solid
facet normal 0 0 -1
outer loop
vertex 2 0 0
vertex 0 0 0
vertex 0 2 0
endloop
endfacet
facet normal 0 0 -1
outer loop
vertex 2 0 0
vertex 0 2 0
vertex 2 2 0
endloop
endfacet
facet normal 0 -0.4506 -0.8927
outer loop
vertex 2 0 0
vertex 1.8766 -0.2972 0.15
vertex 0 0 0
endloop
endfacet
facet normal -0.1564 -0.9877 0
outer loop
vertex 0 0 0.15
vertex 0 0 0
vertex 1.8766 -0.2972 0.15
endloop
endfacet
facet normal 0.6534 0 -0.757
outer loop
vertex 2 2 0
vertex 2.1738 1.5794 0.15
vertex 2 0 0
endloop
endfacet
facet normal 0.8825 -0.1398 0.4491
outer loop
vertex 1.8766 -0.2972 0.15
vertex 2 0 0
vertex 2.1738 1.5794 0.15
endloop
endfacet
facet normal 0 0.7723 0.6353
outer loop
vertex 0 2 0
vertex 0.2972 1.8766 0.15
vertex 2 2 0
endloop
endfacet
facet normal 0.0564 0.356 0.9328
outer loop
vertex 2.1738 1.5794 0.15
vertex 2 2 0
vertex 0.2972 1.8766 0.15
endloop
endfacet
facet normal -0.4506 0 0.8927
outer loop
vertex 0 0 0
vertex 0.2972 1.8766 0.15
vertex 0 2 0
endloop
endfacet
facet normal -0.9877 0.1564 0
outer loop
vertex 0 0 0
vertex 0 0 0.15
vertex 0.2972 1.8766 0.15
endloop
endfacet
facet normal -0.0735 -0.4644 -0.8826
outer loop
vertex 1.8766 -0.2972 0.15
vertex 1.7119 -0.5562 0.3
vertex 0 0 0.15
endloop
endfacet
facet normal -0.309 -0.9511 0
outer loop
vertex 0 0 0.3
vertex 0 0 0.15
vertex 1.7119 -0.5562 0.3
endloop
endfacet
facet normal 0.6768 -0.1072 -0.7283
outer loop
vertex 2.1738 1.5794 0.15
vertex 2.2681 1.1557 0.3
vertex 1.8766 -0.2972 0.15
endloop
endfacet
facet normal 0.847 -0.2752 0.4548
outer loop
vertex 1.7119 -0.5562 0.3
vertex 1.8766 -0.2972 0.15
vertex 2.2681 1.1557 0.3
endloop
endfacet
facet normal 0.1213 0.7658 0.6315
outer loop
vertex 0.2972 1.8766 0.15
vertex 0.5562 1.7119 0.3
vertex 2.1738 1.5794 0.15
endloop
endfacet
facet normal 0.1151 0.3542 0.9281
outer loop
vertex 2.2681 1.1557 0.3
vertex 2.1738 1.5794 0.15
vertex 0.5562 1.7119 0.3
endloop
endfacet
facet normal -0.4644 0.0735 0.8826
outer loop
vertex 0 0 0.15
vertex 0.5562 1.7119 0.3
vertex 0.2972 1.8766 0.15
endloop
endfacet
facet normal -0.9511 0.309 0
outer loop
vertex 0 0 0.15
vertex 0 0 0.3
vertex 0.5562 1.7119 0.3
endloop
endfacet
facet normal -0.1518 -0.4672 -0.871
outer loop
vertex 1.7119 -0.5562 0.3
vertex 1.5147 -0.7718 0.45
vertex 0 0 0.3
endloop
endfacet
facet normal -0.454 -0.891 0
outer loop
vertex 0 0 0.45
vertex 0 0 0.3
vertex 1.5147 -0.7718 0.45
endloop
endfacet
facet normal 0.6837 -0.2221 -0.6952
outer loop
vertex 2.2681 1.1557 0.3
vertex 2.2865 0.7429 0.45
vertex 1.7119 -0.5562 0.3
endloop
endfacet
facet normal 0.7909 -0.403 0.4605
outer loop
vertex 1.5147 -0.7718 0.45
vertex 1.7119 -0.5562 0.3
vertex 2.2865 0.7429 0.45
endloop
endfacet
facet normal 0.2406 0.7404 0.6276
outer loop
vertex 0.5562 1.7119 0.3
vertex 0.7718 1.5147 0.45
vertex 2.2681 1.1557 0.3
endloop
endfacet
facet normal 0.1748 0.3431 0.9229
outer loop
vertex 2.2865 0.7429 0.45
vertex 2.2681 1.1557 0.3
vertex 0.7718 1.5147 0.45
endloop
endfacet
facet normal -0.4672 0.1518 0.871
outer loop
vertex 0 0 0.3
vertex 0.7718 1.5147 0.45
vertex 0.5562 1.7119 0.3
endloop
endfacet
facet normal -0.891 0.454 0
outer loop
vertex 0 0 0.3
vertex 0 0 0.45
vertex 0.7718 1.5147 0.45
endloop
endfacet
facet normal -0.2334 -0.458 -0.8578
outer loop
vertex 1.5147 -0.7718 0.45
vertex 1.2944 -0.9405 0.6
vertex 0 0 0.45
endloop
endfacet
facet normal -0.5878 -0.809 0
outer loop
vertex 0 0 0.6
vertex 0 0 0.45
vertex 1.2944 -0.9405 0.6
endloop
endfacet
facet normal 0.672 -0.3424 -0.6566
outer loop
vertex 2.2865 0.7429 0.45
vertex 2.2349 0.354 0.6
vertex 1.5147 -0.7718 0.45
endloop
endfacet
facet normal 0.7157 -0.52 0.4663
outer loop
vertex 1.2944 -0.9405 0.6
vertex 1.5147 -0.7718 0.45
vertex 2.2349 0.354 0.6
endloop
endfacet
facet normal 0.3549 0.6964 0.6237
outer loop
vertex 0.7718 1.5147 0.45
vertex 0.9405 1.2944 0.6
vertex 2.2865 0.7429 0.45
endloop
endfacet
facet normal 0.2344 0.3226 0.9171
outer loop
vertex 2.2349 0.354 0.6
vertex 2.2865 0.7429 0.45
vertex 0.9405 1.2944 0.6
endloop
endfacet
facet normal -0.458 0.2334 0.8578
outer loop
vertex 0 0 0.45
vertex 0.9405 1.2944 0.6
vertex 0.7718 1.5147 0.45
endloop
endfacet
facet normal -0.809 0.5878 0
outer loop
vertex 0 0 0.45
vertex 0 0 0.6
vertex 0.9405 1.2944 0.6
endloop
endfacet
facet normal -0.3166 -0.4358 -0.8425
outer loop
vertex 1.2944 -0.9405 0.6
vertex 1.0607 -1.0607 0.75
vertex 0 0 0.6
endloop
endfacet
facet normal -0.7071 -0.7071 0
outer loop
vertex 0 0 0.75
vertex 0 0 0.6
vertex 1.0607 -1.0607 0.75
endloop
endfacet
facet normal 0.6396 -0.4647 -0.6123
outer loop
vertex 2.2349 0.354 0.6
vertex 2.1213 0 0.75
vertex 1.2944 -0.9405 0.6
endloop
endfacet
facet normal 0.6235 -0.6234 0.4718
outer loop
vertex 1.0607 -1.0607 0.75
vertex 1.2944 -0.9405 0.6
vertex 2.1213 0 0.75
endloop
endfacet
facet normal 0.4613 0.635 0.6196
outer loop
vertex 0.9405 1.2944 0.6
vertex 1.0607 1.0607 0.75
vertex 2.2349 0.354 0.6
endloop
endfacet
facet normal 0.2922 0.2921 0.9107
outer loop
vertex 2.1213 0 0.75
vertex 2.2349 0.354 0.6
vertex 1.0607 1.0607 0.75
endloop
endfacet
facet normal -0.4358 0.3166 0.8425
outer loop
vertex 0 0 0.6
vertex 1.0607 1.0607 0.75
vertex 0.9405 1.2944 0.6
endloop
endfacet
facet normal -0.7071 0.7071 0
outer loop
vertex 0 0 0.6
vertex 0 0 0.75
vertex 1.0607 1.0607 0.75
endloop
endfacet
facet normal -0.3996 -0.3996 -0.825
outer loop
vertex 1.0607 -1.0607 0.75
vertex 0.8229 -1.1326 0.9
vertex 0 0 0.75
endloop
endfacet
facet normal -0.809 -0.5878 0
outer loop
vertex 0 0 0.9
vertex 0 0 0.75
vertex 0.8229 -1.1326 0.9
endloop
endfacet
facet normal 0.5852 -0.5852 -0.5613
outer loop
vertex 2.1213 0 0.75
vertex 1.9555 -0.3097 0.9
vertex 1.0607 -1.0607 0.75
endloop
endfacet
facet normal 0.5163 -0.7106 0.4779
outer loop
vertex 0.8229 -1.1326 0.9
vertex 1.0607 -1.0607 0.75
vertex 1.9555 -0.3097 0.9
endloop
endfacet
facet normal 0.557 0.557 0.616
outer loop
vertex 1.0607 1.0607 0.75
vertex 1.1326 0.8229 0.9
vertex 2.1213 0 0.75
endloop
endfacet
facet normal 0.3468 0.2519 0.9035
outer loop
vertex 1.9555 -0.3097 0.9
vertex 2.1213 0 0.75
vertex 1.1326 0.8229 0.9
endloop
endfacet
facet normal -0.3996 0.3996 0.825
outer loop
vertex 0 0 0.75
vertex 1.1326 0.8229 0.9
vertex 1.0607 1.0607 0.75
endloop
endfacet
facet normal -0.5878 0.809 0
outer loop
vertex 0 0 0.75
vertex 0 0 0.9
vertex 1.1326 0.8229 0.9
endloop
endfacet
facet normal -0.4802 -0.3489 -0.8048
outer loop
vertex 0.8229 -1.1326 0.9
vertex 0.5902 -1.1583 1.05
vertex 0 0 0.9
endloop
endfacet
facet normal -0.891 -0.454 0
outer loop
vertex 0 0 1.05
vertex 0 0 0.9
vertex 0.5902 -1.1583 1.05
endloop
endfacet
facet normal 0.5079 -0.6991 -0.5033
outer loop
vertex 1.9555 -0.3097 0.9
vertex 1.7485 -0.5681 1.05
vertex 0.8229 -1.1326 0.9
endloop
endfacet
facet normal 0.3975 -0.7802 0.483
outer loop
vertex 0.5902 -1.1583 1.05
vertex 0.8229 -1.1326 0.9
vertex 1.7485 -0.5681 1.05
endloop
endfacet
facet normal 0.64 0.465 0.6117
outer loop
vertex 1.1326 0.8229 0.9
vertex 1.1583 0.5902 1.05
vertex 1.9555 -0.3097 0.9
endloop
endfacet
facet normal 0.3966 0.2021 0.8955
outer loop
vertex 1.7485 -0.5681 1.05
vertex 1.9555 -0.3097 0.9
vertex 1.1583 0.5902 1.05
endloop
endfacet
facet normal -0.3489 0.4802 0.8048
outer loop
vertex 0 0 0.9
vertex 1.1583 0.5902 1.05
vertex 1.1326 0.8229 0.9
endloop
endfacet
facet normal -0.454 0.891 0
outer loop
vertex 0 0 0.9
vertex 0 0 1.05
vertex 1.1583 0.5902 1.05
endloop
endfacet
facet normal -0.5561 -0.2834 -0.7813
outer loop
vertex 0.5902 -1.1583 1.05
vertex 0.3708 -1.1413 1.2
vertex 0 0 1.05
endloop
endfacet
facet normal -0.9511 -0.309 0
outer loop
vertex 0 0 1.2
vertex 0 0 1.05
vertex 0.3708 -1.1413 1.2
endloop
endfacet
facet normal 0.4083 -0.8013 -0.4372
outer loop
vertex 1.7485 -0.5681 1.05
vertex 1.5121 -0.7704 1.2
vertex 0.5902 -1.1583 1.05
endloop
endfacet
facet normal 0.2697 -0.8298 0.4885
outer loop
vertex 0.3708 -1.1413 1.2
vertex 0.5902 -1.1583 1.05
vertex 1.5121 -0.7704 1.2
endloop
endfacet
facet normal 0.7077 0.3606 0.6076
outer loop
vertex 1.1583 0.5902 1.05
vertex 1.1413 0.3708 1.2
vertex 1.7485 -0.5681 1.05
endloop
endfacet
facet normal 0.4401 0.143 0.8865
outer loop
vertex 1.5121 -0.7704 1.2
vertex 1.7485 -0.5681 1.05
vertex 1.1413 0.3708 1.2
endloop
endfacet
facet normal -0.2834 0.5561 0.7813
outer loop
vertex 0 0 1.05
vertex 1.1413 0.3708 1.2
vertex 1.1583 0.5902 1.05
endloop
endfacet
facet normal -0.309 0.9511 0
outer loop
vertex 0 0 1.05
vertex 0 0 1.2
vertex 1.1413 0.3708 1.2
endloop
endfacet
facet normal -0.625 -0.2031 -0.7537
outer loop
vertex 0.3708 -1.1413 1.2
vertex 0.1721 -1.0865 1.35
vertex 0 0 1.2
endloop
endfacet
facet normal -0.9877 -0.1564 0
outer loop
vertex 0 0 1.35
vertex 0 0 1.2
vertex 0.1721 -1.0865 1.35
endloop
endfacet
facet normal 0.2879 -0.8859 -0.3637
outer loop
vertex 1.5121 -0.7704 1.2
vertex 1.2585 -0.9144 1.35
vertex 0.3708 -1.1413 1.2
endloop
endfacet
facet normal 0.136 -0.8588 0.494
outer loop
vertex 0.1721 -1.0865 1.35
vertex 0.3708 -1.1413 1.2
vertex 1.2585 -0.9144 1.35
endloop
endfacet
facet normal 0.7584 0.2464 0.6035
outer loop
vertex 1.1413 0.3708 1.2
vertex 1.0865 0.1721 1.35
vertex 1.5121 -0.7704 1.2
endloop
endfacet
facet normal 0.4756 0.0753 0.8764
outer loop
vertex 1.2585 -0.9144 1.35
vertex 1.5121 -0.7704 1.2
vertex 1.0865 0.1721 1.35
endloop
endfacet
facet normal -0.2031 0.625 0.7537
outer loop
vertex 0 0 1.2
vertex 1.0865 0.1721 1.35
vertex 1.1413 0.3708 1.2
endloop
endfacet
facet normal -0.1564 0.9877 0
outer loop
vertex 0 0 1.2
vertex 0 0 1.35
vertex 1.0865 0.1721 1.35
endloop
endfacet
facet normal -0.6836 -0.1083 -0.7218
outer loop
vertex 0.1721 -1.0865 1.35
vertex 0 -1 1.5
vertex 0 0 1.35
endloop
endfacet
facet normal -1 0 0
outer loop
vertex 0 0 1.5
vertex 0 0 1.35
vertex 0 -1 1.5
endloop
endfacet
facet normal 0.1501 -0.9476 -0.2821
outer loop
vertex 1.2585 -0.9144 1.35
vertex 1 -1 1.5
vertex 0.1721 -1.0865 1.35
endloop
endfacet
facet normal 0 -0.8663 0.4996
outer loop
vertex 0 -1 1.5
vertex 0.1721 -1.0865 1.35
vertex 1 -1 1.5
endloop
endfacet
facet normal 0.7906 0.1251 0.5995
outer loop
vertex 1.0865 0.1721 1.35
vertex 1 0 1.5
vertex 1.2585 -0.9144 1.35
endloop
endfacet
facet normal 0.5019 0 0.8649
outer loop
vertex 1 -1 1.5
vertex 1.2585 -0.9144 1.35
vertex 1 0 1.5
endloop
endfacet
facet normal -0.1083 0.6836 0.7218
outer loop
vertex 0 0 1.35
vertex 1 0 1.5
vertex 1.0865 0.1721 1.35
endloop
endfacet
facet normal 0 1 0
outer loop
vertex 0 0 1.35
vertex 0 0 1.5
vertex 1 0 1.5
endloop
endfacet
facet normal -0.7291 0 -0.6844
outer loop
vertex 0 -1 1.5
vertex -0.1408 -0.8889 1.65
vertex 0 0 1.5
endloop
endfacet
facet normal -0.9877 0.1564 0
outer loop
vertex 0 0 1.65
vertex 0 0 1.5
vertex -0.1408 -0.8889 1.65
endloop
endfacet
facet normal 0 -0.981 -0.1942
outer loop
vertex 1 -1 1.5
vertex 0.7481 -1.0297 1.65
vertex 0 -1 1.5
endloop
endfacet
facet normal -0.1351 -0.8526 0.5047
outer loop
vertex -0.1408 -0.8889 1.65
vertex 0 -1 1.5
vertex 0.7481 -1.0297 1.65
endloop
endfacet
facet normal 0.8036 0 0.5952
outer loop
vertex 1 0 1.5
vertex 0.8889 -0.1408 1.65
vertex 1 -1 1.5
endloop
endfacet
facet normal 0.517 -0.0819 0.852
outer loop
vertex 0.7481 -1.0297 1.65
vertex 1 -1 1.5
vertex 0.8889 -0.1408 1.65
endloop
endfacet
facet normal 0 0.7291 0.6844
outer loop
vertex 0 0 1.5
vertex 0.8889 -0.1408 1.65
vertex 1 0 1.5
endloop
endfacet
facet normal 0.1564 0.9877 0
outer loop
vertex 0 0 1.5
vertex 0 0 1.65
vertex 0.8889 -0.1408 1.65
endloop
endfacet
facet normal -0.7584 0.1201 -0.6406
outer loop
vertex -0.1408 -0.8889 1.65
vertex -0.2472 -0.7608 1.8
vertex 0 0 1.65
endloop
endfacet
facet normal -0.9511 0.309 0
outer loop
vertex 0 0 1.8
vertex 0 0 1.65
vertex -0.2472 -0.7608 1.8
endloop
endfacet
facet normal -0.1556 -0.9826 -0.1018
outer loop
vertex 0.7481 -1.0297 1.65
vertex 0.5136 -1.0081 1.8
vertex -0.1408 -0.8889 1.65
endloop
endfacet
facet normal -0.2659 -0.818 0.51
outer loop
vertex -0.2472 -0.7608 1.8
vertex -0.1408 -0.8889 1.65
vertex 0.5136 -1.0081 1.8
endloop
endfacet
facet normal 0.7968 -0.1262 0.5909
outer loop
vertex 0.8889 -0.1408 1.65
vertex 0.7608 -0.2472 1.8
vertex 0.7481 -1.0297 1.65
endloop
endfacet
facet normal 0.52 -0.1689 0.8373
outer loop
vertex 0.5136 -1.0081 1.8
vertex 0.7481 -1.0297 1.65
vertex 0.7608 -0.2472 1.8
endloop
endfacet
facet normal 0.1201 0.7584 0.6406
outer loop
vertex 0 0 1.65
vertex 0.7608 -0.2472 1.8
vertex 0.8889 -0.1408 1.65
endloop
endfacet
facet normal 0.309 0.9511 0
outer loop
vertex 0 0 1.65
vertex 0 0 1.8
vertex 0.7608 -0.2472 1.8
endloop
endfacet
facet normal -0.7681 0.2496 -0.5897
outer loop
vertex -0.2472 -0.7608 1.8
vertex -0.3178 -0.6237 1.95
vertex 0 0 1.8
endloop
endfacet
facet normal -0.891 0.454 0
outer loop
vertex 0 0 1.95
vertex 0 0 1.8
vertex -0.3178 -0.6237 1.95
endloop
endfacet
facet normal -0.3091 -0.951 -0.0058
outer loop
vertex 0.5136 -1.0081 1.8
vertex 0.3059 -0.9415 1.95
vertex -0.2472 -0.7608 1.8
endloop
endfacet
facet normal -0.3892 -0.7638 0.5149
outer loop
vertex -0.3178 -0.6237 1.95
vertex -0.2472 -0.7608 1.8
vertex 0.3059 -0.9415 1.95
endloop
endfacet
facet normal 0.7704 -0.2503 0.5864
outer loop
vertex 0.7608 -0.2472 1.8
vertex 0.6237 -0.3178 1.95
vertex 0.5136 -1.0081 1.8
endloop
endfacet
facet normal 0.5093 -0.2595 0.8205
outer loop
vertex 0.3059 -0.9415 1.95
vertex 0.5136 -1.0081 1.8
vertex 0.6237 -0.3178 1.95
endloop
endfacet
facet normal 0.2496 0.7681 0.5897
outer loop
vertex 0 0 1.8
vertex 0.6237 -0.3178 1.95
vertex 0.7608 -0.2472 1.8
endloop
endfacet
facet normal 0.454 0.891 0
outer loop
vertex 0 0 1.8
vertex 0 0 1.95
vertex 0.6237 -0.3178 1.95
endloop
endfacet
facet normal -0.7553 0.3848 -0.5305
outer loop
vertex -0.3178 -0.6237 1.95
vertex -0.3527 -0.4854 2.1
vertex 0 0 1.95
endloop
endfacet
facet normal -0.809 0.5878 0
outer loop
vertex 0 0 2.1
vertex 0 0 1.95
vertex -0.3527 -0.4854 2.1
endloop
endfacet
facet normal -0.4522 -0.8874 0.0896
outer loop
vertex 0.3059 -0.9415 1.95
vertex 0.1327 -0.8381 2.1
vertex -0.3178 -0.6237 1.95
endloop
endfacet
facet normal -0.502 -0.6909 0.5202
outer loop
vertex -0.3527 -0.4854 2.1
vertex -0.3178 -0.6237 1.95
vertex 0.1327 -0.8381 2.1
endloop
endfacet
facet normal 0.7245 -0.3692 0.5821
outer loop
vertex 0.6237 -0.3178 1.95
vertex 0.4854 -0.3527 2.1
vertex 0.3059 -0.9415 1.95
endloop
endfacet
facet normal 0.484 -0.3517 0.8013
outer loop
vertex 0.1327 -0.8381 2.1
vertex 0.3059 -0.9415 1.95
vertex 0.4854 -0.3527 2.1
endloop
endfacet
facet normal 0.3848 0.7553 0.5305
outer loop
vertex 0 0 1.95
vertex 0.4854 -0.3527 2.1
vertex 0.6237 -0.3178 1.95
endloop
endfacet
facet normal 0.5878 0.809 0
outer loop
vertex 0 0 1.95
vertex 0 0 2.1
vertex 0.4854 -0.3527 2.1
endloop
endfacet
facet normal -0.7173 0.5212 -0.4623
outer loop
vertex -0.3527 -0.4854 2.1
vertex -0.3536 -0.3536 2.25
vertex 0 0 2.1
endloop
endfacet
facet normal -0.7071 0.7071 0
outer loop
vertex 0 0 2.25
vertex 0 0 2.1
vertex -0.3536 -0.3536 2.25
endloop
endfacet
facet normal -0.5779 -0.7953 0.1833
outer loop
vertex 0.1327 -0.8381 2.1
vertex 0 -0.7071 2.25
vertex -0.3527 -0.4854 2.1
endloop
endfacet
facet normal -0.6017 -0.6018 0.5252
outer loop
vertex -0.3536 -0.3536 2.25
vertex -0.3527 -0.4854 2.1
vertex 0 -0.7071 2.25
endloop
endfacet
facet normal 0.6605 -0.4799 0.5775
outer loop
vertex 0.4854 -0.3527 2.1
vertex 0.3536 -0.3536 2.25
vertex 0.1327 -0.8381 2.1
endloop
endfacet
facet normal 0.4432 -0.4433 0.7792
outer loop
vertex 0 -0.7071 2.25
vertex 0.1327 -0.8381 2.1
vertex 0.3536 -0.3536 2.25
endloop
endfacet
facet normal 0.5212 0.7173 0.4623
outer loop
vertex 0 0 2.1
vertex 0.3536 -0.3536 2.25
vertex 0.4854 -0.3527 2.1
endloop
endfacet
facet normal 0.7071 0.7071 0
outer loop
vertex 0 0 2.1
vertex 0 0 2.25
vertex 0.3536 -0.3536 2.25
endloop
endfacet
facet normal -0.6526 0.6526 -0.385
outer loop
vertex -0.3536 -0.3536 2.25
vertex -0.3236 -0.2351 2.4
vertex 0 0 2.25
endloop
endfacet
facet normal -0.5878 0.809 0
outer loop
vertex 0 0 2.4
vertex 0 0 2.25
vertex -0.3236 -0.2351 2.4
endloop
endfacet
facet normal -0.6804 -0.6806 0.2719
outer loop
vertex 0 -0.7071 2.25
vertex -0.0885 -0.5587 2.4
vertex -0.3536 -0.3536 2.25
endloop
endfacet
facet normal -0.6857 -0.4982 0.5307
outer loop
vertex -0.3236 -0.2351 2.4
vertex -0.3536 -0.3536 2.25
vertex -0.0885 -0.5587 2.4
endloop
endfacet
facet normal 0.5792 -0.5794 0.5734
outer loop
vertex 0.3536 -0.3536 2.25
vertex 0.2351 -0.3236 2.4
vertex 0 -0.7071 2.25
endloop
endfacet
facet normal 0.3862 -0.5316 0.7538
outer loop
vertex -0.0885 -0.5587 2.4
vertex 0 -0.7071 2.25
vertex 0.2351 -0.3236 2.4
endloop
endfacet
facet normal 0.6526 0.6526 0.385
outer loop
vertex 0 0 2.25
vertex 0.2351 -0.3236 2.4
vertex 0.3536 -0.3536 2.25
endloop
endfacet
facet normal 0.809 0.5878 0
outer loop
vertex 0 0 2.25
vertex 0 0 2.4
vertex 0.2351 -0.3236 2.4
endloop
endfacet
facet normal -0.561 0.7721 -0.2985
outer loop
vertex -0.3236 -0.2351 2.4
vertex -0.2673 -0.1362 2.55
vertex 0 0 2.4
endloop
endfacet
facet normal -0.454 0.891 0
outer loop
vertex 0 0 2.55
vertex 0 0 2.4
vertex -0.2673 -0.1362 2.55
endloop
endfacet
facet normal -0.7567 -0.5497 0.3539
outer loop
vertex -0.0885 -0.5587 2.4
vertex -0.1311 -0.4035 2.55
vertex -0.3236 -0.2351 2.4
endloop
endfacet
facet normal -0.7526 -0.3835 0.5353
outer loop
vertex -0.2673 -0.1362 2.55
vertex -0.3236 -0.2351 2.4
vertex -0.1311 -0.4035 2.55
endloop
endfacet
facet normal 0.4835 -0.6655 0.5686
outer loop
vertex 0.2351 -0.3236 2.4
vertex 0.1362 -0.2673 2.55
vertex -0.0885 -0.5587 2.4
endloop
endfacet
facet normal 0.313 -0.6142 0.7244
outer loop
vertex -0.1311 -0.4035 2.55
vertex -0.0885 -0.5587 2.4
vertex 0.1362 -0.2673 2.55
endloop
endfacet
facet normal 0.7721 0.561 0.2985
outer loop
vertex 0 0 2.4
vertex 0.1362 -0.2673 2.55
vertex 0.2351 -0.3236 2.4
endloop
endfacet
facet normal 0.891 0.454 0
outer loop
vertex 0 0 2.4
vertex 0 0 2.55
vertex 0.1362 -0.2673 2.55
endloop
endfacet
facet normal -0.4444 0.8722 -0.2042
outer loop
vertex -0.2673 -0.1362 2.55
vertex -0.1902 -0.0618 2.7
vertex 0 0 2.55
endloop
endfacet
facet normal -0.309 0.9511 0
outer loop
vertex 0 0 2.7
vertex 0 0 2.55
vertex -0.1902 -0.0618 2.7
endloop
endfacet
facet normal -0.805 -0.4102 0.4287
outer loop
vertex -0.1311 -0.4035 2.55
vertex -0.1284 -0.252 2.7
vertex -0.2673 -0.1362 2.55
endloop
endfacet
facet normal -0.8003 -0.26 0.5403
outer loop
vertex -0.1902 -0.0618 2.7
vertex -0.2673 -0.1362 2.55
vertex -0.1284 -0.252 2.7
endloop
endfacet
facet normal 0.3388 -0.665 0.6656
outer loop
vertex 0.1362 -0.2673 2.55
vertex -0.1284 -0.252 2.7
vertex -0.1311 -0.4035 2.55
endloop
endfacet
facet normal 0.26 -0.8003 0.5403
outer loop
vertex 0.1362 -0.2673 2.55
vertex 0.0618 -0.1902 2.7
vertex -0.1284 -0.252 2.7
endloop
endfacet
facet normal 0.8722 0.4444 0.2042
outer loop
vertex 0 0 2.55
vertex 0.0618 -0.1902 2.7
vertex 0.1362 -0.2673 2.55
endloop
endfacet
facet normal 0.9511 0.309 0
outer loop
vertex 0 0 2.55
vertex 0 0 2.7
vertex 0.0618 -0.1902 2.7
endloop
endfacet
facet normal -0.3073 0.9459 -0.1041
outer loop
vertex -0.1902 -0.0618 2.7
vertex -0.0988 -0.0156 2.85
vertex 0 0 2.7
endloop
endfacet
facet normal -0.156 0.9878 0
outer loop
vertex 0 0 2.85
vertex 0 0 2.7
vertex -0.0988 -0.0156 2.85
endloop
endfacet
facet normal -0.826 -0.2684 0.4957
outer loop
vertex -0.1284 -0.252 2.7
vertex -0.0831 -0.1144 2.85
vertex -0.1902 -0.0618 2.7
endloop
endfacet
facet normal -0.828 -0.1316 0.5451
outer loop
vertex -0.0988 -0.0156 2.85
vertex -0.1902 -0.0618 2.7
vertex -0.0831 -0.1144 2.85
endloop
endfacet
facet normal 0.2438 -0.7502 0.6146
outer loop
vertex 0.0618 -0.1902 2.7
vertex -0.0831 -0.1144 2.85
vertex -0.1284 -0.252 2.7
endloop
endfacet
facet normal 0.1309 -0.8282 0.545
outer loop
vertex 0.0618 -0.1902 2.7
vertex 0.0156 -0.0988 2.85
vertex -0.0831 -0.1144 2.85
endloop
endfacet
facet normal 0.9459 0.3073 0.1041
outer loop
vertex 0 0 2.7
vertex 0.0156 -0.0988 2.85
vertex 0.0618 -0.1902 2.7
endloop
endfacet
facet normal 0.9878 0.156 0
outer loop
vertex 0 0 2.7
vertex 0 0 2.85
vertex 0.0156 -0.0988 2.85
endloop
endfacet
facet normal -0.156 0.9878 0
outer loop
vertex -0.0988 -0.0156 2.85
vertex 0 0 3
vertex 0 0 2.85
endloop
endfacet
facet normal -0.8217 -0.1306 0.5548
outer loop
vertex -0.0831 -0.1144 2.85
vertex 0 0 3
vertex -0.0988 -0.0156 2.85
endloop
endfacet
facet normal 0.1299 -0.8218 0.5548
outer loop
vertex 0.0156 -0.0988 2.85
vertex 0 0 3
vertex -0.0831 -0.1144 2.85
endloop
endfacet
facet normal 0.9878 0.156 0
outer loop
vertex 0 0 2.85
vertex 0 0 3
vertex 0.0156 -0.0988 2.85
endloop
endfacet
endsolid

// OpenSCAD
// SYMPTOM: linear_extrude with BOTH a twist and a scale whose top collapses to
//   a POINT (scale=[0,0]) imported as a NULL shape (stage=invalid-shape, "all
//   root shapes are null"). The one-zero (line) collapse, e.g. scale=[0,1], was
//   NOT affected -- it already built a valid solid. Drove corpus
//   t3d__linear_extrude-scale-zero-tests (44.8 %) and ex__linear_extrude (24 %).
// CAUSE: OpenSCADFeatures.Twist.execute. The A2#6 degenerate-taper branch (which
//   builds the tapered solid analytically by joining base perimeter vertices to
//   their scaled top vertices) was gated on `fp.Angle.Value == 0.0`. With a twist
//   the point-collapse case skipped that branch and fell through to MakePipeShell
//   between the base wire and the zero-area point top, whose sweep direction is
//   undefined -> "gp_Dir() - input vector has zero norm" -> null shape.
// FIX: OpenSCADFeatures.py Twist.execute -> take the analytic _taper_solid path
//   whenever the top collapses to a point (abs(sx)<eps AND abs(sy)<eps),
//   regardless of the twist angle, keeping the no-twist one-zero (line) branch
//   and leaving the twist+line case on its working MakePipeShell path. A point
//   apex lies ON the twist axis, so the twist leaves it invariant: the solid is
//   exactly the straight pyramid. Commit 8e36697899.
// EXPECTED (OpenSCAD): twist preserves cross-sectional area, so the volume equals
//   the no-twist value. A 2x2 base extruded h=3 tapering to a point (scale=[0,0])
//   is a pyramid of base*h/3 = 4*3/3 = 4 (OpenSCAD's 20-slice render is 4.087, a
//   2.1 % discretization overshoot above the smooth limit -- faceting-class).
linear_extrude(height = 3, twist = 180, slices = 20, scale = [0, 0])
	square([2, 2]);
